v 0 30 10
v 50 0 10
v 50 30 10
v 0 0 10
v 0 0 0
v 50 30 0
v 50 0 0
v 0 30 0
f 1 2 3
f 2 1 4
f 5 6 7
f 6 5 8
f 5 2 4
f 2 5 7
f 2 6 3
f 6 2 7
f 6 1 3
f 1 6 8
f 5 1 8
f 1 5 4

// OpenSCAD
// Define dimensions for the rectangular block
block_length = 50;  // Length of the block
block_width = 30;   // Width of the block
block_height = 10;  // Height of the block

// Create the rectangular block
cube([block_length, block_width, block_height]);
